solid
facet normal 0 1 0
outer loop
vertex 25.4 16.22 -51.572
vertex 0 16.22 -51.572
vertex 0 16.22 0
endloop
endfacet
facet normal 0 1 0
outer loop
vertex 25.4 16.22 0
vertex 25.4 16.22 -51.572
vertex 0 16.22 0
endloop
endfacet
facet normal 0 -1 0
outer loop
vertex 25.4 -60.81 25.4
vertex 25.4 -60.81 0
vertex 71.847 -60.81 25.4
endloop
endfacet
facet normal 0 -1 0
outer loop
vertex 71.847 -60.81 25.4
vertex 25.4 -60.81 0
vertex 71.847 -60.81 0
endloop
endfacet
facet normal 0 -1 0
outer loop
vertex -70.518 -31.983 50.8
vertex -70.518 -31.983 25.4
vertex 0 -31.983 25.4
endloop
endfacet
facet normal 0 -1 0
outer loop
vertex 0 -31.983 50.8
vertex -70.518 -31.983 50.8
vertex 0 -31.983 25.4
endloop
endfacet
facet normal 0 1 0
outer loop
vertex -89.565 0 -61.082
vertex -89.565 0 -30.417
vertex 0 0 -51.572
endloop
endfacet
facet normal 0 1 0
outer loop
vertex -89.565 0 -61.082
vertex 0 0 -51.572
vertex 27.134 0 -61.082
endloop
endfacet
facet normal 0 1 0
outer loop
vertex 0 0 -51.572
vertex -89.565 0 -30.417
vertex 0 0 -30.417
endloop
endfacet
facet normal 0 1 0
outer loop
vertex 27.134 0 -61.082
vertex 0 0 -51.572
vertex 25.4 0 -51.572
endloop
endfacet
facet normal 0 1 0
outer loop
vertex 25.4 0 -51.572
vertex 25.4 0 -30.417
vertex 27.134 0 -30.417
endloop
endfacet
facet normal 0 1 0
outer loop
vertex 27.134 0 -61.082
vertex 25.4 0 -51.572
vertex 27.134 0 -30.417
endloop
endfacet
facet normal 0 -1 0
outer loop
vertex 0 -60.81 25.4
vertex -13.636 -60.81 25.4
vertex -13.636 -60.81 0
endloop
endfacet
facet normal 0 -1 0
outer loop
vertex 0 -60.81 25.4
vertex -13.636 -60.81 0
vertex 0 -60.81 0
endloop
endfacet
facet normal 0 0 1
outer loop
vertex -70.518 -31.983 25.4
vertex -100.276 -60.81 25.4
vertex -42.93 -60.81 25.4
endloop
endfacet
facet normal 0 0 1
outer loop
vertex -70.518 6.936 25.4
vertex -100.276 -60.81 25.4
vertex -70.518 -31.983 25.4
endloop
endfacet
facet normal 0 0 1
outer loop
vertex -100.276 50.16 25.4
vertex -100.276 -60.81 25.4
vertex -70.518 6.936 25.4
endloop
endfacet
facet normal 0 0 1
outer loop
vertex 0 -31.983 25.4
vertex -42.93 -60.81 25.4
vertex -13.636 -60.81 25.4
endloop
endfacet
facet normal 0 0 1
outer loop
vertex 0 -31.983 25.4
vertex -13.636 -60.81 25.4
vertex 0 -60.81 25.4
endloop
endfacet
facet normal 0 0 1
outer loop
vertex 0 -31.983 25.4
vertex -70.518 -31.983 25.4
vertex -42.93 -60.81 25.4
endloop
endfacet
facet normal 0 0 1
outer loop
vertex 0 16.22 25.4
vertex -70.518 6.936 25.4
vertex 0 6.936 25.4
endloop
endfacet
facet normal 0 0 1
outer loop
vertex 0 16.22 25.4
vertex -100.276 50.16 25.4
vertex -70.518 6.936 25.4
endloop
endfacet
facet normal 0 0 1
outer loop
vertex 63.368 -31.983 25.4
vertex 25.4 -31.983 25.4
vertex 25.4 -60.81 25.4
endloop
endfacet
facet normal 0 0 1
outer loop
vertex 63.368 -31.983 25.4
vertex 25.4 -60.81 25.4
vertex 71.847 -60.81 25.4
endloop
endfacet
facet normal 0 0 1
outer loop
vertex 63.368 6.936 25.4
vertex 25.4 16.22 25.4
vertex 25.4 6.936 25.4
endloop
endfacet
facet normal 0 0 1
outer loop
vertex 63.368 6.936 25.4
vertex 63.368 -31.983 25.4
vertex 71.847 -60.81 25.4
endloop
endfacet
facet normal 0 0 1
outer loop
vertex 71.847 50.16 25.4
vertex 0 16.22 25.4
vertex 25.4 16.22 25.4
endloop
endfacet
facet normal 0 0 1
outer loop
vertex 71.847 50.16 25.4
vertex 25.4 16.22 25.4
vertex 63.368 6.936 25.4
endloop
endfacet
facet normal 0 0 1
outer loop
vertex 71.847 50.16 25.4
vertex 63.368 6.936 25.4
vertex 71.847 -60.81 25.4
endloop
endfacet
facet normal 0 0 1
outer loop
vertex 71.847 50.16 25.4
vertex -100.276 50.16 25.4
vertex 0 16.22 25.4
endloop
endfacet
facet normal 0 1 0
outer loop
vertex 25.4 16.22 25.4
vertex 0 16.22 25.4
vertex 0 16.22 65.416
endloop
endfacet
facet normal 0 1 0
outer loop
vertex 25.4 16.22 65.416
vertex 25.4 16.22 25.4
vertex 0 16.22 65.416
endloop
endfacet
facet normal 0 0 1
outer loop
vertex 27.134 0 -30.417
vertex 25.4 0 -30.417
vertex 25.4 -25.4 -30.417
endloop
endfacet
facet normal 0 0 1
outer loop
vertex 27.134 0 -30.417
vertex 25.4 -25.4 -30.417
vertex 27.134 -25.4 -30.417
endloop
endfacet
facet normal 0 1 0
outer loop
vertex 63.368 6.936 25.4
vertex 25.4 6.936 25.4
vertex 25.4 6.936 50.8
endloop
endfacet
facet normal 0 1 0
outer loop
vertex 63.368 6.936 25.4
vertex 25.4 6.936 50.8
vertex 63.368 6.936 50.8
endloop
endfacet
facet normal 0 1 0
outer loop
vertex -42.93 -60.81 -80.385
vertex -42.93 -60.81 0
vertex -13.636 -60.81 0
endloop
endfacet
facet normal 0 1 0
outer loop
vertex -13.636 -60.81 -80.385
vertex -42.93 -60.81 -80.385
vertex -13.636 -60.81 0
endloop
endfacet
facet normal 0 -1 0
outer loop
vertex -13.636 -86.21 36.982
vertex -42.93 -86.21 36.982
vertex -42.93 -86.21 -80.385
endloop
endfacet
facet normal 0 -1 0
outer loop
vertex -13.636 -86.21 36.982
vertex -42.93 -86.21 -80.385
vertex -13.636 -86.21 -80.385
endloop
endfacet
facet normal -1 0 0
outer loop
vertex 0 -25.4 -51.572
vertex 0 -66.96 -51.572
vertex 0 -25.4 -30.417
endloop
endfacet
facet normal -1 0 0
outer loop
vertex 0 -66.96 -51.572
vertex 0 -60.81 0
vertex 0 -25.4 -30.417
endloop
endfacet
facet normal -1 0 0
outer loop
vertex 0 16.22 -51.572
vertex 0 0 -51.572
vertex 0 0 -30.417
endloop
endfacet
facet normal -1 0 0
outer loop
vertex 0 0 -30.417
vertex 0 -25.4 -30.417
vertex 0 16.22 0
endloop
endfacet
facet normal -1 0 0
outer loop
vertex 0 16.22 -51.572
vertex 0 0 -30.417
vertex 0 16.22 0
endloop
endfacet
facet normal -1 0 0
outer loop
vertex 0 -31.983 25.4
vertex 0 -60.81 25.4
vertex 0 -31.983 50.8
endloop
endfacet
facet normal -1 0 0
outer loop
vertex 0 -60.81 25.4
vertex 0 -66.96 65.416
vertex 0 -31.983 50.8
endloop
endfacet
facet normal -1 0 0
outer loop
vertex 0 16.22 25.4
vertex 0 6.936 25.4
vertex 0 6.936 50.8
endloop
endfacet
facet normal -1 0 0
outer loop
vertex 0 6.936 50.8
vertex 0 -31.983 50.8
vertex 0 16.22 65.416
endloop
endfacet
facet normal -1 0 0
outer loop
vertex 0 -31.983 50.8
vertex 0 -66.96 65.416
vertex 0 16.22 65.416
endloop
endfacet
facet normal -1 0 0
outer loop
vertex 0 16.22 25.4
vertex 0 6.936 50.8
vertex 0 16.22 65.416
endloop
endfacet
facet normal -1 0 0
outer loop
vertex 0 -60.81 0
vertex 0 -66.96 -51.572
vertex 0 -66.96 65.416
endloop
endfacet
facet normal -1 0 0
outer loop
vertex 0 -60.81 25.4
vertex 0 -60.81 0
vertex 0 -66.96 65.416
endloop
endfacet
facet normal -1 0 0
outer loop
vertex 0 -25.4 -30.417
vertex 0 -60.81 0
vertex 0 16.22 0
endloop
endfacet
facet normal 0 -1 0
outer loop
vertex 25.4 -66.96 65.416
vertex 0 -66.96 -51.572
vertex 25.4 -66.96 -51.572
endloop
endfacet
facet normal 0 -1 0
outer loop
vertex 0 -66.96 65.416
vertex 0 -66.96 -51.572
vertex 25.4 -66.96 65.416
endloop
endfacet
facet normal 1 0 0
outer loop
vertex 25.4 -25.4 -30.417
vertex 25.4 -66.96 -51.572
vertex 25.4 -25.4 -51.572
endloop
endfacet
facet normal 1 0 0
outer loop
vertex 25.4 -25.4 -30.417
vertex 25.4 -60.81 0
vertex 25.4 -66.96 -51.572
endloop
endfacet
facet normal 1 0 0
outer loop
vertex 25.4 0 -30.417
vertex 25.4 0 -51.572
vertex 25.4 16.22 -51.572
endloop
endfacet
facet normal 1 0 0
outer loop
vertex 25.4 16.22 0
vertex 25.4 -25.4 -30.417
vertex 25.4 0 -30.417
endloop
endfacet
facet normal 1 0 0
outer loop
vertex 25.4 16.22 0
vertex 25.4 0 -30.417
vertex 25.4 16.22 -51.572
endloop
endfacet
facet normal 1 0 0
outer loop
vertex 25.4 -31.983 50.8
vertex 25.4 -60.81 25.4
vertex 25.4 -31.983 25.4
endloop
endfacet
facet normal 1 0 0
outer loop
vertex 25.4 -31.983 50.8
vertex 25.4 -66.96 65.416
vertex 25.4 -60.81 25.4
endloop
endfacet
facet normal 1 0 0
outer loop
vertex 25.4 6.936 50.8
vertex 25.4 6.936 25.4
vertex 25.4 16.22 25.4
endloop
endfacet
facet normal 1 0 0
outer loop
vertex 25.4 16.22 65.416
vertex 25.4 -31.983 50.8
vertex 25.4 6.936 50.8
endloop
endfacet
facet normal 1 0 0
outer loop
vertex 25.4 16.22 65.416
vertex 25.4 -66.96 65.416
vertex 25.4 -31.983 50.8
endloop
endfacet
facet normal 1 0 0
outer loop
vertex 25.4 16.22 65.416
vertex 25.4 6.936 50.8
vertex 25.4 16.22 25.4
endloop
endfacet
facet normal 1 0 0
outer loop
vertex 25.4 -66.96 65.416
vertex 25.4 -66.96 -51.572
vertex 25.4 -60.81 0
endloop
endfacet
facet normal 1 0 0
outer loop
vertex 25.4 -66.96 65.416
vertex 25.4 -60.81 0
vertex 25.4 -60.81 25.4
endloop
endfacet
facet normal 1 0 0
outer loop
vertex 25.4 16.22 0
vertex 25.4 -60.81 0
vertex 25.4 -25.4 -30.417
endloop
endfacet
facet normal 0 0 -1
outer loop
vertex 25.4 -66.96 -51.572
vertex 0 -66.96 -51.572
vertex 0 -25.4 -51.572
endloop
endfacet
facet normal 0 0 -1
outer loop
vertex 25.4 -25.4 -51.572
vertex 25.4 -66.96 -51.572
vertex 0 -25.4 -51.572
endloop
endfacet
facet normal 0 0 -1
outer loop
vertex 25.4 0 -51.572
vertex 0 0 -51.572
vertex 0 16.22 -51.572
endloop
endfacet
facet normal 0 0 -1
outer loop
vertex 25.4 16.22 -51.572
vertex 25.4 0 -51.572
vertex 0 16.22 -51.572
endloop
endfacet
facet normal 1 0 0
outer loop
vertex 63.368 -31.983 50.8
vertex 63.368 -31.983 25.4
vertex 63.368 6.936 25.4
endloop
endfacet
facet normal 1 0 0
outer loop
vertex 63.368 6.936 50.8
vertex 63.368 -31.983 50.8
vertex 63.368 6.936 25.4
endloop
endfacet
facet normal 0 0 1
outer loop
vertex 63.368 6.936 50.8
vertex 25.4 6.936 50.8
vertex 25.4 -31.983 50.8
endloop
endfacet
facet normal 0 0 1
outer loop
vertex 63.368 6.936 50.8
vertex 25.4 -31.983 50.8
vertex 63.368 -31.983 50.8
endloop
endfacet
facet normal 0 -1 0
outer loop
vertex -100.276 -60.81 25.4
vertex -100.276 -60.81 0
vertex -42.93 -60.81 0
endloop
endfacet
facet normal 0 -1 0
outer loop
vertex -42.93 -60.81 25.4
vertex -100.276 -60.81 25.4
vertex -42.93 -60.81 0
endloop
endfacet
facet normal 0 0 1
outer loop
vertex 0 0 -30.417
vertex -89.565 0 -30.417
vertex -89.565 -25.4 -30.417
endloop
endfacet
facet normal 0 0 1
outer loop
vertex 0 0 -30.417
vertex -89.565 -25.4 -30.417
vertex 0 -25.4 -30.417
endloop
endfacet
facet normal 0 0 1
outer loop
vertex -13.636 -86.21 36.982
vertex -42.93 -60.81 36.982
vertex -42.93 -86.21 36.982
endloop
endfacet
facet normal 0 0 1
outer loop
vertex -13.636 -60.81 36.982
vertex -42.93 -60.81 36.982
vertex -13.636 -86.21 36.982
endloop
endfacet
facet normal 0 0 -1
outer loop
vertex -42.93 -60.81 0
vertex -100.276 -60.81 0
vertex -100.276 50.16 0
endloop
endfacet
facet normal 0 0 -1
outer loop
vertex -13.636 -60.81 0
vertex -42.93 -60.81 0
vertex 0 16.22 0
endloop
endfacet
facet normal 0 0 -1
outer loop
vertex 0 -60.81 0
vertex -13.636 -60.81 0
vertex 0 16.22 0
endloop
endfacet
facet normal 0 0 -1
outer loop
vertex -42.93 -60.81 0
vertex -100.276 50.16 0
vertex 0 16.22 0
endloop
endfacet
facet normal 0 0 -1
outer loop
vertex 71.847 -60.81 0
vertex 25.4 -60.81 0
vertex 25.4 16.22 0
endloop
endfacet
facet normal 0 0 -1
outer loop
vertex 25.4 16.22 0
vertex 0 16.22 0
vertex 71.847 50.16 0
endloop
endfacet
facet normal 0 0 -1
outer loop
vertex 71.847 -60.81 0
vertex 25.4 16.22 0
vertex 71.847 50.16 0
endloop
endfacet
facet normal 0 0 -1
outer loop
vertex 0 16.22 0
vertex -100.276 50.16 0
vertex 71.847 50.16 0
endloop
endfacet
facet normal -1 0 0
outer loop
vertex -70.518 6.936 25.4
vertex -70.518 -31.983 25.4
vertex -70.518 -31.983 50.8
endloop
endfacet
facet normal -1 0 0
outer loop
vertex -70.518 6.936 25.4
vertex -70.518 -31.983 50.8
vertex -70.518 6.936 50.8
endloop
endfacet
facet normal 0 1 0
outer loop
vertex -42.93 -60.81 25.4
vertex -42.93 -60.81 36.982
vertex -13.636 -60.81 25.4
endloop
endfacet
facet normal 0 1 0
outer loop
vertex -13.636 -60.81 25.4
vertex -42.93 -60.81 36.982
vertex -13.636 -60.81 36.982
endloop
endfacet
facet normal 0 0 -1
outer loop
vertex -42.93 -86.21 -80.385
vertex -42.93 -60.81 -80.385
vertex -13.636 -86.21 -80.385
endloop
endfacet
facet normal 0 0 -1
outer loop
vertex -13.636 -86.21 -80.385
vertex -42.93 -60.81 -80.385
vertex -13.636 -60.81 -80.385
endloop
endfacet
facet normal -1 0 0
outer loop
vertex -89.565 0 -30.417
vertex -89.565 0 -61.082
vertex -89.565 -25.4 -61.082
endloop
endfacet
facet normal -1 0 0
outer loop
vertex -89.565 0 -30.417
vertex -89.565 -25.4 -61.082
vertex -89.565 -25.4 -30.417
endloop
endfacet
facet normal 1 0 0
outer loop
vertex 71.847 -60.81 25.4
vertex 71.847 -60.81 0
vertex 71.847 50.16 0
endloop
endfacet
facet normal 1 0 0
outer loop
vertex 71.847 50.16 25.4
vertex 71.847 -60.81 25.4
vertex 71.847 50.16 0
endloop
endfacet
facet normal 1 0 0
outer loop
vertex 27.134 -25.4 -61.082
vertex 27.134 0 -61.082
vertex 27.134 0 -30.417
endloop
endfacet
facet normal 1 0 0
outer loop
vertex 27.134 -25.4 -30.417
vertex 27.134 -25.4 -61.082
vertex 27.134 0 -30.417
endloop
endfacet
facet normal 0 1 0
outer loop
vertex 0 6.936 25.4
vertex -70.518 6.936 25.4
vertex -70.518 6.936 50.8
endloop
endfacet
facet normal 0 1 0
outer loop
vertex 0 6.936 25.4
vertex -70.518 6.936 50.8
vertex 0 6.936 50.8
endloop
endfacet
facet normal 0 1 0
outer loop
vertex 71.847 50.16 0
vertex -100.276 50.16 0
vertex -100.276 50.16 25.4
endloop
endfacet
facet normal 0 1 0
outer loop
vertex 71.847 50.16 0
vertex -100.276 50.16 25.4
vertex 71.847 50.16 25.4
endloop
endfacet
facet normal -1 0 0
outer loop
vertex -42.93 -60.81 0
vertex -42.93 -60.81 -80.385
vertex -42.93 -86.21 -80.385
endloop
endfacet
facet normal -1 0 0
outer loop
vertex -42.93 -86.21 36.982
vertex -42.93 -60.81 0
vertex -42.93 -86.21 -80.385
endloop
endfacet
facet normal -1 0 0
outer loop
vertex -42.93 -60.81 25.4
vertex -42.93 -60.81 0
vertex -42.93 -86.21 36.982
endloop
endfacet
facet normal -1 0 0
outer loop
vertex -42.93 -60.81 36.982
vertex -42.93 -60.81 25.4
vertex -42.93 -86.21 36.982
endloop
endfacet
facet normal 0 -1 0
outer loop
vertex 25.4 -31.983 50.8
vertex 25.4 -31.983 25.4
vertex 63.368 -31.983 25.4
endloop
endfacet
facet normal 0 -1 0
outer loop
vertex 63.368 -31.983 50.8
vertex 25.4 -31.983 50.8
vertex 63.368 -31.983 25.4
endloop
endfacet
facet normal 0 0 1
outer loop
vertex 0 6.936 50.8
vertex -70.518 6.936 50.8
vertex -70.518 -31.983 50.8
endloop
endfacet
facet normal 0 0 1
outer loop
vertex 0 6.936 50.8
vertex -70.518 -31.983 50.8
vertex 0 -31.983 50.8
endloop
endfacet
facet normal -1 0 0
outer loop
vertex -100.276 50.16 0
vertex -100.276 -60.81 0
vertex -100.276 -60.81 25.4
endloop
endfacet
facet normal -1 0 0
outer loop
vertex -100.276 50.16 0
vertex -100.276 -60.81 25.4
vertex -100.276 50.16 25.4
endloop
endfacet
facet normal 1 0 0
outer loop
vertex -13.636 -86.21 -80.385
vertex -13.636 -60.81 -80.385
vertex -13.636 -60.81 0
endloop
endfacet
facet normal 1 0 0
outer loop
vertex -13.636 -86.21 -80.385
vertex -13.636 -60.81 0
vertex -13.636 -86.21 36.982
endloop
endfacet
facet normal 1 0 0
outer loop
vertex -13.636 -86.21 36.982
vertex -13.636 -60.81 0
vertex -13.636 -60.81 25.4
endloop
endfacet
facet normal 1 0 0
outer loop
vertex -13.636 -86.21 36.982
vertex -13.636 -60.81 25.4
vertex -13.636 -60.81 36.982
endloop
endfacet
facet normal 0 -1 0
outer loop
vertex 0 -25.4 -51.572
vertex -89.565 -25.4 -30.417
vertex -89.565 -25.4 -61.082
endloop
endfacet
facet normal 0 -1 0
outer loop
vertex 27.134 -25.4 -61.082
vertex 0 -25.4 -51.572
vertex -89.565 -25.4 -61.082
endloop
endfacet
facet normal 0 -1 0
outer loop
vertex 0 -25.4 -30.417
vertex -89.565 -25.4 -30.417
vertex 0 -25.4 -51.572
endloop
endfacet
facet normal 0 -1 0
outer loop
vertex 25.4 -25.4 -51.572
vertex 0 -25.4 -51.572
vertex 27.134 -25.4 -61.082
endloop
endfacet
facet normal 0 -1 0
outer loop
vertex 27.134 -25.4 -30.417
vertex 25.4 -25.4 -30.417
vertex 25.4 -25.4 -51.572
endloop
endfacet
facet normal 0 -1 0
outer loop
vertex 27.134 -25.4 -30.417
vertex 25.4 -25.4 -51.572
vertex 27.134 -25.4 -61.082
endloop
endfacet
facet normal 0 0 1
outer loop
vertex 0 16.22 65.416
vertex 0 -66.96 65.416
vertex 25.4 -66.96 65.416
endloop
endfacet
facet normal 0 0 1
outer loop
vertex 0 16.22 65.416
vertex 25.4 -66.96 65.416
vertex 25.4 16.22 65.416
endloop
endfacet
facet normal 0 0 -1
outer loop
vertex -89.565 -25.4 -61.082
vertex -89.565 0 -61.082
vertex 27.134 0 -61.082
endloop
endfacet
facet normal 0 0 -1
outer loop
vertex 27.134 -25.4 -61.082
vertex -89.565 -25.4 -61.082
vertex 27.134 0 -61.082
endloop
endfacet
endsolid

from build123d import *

# Parameters (mm, degrees)
F0_W     = 83.18023
F0_H     = 116.987984
F1_DEPTH = 25.4
F2_W     = 172.123075
F2_H     = 110.970385
F3_DEPTH = 25.4
F4_W     = 116.698637
F4_H     = 30.664335
F5_DEPTH = 25.4
F6_W     = 133.886017
F6_H     = 38.919249
F7_DEPTH = 25.4
F8_W     = 29.294722
F8_H     = 117.36656
F9_DEPTH = 25.4


with BuildPart() as f1:
    # F0 (on Right) → F1 (new body)
    with BuildSketch(Plane.YZ):
        with Locations((-25.369966, 6.922083)):
            Rectangle(F0_W, F0_H)
    extrude(amount=F1_DEPTH)

    # F2 (on Top) → F3 (join)
    with BuildSketch(Plane.XY):
        with Locations((-14.214217, -5.325139)):
            Rectangle(F2_W, F2_H)
    extrude(amount=F3_DEPTH)

    # F4 (on Front) → F5 (join)
    with BuildSketch(Plane.XZ):
        with Locations((-31.215682, -45.749648)):
            Rectangle(F4_W, F4_H)
    extrude(amount=F5_DEPTH)

    # F6 (on face) → F7 (join)
    with BuildSketch(Plane.XY.offset(25.4)):
        with Locations((-3.574874, -12.523699)):
            Rectangle(F6_W, F6_H)
    extrude(amount=F7_DEPTH)

    # F8 (on face) → F9 (join)
    with BuildSketch(Plane.XZ.offset(60.810331)):
        with Locations((-28.282989, -21.701511)):
            Rectangle(F8_W, F8_H)
    extrude(amount=F9_DEPTH)


solid = f1.part
